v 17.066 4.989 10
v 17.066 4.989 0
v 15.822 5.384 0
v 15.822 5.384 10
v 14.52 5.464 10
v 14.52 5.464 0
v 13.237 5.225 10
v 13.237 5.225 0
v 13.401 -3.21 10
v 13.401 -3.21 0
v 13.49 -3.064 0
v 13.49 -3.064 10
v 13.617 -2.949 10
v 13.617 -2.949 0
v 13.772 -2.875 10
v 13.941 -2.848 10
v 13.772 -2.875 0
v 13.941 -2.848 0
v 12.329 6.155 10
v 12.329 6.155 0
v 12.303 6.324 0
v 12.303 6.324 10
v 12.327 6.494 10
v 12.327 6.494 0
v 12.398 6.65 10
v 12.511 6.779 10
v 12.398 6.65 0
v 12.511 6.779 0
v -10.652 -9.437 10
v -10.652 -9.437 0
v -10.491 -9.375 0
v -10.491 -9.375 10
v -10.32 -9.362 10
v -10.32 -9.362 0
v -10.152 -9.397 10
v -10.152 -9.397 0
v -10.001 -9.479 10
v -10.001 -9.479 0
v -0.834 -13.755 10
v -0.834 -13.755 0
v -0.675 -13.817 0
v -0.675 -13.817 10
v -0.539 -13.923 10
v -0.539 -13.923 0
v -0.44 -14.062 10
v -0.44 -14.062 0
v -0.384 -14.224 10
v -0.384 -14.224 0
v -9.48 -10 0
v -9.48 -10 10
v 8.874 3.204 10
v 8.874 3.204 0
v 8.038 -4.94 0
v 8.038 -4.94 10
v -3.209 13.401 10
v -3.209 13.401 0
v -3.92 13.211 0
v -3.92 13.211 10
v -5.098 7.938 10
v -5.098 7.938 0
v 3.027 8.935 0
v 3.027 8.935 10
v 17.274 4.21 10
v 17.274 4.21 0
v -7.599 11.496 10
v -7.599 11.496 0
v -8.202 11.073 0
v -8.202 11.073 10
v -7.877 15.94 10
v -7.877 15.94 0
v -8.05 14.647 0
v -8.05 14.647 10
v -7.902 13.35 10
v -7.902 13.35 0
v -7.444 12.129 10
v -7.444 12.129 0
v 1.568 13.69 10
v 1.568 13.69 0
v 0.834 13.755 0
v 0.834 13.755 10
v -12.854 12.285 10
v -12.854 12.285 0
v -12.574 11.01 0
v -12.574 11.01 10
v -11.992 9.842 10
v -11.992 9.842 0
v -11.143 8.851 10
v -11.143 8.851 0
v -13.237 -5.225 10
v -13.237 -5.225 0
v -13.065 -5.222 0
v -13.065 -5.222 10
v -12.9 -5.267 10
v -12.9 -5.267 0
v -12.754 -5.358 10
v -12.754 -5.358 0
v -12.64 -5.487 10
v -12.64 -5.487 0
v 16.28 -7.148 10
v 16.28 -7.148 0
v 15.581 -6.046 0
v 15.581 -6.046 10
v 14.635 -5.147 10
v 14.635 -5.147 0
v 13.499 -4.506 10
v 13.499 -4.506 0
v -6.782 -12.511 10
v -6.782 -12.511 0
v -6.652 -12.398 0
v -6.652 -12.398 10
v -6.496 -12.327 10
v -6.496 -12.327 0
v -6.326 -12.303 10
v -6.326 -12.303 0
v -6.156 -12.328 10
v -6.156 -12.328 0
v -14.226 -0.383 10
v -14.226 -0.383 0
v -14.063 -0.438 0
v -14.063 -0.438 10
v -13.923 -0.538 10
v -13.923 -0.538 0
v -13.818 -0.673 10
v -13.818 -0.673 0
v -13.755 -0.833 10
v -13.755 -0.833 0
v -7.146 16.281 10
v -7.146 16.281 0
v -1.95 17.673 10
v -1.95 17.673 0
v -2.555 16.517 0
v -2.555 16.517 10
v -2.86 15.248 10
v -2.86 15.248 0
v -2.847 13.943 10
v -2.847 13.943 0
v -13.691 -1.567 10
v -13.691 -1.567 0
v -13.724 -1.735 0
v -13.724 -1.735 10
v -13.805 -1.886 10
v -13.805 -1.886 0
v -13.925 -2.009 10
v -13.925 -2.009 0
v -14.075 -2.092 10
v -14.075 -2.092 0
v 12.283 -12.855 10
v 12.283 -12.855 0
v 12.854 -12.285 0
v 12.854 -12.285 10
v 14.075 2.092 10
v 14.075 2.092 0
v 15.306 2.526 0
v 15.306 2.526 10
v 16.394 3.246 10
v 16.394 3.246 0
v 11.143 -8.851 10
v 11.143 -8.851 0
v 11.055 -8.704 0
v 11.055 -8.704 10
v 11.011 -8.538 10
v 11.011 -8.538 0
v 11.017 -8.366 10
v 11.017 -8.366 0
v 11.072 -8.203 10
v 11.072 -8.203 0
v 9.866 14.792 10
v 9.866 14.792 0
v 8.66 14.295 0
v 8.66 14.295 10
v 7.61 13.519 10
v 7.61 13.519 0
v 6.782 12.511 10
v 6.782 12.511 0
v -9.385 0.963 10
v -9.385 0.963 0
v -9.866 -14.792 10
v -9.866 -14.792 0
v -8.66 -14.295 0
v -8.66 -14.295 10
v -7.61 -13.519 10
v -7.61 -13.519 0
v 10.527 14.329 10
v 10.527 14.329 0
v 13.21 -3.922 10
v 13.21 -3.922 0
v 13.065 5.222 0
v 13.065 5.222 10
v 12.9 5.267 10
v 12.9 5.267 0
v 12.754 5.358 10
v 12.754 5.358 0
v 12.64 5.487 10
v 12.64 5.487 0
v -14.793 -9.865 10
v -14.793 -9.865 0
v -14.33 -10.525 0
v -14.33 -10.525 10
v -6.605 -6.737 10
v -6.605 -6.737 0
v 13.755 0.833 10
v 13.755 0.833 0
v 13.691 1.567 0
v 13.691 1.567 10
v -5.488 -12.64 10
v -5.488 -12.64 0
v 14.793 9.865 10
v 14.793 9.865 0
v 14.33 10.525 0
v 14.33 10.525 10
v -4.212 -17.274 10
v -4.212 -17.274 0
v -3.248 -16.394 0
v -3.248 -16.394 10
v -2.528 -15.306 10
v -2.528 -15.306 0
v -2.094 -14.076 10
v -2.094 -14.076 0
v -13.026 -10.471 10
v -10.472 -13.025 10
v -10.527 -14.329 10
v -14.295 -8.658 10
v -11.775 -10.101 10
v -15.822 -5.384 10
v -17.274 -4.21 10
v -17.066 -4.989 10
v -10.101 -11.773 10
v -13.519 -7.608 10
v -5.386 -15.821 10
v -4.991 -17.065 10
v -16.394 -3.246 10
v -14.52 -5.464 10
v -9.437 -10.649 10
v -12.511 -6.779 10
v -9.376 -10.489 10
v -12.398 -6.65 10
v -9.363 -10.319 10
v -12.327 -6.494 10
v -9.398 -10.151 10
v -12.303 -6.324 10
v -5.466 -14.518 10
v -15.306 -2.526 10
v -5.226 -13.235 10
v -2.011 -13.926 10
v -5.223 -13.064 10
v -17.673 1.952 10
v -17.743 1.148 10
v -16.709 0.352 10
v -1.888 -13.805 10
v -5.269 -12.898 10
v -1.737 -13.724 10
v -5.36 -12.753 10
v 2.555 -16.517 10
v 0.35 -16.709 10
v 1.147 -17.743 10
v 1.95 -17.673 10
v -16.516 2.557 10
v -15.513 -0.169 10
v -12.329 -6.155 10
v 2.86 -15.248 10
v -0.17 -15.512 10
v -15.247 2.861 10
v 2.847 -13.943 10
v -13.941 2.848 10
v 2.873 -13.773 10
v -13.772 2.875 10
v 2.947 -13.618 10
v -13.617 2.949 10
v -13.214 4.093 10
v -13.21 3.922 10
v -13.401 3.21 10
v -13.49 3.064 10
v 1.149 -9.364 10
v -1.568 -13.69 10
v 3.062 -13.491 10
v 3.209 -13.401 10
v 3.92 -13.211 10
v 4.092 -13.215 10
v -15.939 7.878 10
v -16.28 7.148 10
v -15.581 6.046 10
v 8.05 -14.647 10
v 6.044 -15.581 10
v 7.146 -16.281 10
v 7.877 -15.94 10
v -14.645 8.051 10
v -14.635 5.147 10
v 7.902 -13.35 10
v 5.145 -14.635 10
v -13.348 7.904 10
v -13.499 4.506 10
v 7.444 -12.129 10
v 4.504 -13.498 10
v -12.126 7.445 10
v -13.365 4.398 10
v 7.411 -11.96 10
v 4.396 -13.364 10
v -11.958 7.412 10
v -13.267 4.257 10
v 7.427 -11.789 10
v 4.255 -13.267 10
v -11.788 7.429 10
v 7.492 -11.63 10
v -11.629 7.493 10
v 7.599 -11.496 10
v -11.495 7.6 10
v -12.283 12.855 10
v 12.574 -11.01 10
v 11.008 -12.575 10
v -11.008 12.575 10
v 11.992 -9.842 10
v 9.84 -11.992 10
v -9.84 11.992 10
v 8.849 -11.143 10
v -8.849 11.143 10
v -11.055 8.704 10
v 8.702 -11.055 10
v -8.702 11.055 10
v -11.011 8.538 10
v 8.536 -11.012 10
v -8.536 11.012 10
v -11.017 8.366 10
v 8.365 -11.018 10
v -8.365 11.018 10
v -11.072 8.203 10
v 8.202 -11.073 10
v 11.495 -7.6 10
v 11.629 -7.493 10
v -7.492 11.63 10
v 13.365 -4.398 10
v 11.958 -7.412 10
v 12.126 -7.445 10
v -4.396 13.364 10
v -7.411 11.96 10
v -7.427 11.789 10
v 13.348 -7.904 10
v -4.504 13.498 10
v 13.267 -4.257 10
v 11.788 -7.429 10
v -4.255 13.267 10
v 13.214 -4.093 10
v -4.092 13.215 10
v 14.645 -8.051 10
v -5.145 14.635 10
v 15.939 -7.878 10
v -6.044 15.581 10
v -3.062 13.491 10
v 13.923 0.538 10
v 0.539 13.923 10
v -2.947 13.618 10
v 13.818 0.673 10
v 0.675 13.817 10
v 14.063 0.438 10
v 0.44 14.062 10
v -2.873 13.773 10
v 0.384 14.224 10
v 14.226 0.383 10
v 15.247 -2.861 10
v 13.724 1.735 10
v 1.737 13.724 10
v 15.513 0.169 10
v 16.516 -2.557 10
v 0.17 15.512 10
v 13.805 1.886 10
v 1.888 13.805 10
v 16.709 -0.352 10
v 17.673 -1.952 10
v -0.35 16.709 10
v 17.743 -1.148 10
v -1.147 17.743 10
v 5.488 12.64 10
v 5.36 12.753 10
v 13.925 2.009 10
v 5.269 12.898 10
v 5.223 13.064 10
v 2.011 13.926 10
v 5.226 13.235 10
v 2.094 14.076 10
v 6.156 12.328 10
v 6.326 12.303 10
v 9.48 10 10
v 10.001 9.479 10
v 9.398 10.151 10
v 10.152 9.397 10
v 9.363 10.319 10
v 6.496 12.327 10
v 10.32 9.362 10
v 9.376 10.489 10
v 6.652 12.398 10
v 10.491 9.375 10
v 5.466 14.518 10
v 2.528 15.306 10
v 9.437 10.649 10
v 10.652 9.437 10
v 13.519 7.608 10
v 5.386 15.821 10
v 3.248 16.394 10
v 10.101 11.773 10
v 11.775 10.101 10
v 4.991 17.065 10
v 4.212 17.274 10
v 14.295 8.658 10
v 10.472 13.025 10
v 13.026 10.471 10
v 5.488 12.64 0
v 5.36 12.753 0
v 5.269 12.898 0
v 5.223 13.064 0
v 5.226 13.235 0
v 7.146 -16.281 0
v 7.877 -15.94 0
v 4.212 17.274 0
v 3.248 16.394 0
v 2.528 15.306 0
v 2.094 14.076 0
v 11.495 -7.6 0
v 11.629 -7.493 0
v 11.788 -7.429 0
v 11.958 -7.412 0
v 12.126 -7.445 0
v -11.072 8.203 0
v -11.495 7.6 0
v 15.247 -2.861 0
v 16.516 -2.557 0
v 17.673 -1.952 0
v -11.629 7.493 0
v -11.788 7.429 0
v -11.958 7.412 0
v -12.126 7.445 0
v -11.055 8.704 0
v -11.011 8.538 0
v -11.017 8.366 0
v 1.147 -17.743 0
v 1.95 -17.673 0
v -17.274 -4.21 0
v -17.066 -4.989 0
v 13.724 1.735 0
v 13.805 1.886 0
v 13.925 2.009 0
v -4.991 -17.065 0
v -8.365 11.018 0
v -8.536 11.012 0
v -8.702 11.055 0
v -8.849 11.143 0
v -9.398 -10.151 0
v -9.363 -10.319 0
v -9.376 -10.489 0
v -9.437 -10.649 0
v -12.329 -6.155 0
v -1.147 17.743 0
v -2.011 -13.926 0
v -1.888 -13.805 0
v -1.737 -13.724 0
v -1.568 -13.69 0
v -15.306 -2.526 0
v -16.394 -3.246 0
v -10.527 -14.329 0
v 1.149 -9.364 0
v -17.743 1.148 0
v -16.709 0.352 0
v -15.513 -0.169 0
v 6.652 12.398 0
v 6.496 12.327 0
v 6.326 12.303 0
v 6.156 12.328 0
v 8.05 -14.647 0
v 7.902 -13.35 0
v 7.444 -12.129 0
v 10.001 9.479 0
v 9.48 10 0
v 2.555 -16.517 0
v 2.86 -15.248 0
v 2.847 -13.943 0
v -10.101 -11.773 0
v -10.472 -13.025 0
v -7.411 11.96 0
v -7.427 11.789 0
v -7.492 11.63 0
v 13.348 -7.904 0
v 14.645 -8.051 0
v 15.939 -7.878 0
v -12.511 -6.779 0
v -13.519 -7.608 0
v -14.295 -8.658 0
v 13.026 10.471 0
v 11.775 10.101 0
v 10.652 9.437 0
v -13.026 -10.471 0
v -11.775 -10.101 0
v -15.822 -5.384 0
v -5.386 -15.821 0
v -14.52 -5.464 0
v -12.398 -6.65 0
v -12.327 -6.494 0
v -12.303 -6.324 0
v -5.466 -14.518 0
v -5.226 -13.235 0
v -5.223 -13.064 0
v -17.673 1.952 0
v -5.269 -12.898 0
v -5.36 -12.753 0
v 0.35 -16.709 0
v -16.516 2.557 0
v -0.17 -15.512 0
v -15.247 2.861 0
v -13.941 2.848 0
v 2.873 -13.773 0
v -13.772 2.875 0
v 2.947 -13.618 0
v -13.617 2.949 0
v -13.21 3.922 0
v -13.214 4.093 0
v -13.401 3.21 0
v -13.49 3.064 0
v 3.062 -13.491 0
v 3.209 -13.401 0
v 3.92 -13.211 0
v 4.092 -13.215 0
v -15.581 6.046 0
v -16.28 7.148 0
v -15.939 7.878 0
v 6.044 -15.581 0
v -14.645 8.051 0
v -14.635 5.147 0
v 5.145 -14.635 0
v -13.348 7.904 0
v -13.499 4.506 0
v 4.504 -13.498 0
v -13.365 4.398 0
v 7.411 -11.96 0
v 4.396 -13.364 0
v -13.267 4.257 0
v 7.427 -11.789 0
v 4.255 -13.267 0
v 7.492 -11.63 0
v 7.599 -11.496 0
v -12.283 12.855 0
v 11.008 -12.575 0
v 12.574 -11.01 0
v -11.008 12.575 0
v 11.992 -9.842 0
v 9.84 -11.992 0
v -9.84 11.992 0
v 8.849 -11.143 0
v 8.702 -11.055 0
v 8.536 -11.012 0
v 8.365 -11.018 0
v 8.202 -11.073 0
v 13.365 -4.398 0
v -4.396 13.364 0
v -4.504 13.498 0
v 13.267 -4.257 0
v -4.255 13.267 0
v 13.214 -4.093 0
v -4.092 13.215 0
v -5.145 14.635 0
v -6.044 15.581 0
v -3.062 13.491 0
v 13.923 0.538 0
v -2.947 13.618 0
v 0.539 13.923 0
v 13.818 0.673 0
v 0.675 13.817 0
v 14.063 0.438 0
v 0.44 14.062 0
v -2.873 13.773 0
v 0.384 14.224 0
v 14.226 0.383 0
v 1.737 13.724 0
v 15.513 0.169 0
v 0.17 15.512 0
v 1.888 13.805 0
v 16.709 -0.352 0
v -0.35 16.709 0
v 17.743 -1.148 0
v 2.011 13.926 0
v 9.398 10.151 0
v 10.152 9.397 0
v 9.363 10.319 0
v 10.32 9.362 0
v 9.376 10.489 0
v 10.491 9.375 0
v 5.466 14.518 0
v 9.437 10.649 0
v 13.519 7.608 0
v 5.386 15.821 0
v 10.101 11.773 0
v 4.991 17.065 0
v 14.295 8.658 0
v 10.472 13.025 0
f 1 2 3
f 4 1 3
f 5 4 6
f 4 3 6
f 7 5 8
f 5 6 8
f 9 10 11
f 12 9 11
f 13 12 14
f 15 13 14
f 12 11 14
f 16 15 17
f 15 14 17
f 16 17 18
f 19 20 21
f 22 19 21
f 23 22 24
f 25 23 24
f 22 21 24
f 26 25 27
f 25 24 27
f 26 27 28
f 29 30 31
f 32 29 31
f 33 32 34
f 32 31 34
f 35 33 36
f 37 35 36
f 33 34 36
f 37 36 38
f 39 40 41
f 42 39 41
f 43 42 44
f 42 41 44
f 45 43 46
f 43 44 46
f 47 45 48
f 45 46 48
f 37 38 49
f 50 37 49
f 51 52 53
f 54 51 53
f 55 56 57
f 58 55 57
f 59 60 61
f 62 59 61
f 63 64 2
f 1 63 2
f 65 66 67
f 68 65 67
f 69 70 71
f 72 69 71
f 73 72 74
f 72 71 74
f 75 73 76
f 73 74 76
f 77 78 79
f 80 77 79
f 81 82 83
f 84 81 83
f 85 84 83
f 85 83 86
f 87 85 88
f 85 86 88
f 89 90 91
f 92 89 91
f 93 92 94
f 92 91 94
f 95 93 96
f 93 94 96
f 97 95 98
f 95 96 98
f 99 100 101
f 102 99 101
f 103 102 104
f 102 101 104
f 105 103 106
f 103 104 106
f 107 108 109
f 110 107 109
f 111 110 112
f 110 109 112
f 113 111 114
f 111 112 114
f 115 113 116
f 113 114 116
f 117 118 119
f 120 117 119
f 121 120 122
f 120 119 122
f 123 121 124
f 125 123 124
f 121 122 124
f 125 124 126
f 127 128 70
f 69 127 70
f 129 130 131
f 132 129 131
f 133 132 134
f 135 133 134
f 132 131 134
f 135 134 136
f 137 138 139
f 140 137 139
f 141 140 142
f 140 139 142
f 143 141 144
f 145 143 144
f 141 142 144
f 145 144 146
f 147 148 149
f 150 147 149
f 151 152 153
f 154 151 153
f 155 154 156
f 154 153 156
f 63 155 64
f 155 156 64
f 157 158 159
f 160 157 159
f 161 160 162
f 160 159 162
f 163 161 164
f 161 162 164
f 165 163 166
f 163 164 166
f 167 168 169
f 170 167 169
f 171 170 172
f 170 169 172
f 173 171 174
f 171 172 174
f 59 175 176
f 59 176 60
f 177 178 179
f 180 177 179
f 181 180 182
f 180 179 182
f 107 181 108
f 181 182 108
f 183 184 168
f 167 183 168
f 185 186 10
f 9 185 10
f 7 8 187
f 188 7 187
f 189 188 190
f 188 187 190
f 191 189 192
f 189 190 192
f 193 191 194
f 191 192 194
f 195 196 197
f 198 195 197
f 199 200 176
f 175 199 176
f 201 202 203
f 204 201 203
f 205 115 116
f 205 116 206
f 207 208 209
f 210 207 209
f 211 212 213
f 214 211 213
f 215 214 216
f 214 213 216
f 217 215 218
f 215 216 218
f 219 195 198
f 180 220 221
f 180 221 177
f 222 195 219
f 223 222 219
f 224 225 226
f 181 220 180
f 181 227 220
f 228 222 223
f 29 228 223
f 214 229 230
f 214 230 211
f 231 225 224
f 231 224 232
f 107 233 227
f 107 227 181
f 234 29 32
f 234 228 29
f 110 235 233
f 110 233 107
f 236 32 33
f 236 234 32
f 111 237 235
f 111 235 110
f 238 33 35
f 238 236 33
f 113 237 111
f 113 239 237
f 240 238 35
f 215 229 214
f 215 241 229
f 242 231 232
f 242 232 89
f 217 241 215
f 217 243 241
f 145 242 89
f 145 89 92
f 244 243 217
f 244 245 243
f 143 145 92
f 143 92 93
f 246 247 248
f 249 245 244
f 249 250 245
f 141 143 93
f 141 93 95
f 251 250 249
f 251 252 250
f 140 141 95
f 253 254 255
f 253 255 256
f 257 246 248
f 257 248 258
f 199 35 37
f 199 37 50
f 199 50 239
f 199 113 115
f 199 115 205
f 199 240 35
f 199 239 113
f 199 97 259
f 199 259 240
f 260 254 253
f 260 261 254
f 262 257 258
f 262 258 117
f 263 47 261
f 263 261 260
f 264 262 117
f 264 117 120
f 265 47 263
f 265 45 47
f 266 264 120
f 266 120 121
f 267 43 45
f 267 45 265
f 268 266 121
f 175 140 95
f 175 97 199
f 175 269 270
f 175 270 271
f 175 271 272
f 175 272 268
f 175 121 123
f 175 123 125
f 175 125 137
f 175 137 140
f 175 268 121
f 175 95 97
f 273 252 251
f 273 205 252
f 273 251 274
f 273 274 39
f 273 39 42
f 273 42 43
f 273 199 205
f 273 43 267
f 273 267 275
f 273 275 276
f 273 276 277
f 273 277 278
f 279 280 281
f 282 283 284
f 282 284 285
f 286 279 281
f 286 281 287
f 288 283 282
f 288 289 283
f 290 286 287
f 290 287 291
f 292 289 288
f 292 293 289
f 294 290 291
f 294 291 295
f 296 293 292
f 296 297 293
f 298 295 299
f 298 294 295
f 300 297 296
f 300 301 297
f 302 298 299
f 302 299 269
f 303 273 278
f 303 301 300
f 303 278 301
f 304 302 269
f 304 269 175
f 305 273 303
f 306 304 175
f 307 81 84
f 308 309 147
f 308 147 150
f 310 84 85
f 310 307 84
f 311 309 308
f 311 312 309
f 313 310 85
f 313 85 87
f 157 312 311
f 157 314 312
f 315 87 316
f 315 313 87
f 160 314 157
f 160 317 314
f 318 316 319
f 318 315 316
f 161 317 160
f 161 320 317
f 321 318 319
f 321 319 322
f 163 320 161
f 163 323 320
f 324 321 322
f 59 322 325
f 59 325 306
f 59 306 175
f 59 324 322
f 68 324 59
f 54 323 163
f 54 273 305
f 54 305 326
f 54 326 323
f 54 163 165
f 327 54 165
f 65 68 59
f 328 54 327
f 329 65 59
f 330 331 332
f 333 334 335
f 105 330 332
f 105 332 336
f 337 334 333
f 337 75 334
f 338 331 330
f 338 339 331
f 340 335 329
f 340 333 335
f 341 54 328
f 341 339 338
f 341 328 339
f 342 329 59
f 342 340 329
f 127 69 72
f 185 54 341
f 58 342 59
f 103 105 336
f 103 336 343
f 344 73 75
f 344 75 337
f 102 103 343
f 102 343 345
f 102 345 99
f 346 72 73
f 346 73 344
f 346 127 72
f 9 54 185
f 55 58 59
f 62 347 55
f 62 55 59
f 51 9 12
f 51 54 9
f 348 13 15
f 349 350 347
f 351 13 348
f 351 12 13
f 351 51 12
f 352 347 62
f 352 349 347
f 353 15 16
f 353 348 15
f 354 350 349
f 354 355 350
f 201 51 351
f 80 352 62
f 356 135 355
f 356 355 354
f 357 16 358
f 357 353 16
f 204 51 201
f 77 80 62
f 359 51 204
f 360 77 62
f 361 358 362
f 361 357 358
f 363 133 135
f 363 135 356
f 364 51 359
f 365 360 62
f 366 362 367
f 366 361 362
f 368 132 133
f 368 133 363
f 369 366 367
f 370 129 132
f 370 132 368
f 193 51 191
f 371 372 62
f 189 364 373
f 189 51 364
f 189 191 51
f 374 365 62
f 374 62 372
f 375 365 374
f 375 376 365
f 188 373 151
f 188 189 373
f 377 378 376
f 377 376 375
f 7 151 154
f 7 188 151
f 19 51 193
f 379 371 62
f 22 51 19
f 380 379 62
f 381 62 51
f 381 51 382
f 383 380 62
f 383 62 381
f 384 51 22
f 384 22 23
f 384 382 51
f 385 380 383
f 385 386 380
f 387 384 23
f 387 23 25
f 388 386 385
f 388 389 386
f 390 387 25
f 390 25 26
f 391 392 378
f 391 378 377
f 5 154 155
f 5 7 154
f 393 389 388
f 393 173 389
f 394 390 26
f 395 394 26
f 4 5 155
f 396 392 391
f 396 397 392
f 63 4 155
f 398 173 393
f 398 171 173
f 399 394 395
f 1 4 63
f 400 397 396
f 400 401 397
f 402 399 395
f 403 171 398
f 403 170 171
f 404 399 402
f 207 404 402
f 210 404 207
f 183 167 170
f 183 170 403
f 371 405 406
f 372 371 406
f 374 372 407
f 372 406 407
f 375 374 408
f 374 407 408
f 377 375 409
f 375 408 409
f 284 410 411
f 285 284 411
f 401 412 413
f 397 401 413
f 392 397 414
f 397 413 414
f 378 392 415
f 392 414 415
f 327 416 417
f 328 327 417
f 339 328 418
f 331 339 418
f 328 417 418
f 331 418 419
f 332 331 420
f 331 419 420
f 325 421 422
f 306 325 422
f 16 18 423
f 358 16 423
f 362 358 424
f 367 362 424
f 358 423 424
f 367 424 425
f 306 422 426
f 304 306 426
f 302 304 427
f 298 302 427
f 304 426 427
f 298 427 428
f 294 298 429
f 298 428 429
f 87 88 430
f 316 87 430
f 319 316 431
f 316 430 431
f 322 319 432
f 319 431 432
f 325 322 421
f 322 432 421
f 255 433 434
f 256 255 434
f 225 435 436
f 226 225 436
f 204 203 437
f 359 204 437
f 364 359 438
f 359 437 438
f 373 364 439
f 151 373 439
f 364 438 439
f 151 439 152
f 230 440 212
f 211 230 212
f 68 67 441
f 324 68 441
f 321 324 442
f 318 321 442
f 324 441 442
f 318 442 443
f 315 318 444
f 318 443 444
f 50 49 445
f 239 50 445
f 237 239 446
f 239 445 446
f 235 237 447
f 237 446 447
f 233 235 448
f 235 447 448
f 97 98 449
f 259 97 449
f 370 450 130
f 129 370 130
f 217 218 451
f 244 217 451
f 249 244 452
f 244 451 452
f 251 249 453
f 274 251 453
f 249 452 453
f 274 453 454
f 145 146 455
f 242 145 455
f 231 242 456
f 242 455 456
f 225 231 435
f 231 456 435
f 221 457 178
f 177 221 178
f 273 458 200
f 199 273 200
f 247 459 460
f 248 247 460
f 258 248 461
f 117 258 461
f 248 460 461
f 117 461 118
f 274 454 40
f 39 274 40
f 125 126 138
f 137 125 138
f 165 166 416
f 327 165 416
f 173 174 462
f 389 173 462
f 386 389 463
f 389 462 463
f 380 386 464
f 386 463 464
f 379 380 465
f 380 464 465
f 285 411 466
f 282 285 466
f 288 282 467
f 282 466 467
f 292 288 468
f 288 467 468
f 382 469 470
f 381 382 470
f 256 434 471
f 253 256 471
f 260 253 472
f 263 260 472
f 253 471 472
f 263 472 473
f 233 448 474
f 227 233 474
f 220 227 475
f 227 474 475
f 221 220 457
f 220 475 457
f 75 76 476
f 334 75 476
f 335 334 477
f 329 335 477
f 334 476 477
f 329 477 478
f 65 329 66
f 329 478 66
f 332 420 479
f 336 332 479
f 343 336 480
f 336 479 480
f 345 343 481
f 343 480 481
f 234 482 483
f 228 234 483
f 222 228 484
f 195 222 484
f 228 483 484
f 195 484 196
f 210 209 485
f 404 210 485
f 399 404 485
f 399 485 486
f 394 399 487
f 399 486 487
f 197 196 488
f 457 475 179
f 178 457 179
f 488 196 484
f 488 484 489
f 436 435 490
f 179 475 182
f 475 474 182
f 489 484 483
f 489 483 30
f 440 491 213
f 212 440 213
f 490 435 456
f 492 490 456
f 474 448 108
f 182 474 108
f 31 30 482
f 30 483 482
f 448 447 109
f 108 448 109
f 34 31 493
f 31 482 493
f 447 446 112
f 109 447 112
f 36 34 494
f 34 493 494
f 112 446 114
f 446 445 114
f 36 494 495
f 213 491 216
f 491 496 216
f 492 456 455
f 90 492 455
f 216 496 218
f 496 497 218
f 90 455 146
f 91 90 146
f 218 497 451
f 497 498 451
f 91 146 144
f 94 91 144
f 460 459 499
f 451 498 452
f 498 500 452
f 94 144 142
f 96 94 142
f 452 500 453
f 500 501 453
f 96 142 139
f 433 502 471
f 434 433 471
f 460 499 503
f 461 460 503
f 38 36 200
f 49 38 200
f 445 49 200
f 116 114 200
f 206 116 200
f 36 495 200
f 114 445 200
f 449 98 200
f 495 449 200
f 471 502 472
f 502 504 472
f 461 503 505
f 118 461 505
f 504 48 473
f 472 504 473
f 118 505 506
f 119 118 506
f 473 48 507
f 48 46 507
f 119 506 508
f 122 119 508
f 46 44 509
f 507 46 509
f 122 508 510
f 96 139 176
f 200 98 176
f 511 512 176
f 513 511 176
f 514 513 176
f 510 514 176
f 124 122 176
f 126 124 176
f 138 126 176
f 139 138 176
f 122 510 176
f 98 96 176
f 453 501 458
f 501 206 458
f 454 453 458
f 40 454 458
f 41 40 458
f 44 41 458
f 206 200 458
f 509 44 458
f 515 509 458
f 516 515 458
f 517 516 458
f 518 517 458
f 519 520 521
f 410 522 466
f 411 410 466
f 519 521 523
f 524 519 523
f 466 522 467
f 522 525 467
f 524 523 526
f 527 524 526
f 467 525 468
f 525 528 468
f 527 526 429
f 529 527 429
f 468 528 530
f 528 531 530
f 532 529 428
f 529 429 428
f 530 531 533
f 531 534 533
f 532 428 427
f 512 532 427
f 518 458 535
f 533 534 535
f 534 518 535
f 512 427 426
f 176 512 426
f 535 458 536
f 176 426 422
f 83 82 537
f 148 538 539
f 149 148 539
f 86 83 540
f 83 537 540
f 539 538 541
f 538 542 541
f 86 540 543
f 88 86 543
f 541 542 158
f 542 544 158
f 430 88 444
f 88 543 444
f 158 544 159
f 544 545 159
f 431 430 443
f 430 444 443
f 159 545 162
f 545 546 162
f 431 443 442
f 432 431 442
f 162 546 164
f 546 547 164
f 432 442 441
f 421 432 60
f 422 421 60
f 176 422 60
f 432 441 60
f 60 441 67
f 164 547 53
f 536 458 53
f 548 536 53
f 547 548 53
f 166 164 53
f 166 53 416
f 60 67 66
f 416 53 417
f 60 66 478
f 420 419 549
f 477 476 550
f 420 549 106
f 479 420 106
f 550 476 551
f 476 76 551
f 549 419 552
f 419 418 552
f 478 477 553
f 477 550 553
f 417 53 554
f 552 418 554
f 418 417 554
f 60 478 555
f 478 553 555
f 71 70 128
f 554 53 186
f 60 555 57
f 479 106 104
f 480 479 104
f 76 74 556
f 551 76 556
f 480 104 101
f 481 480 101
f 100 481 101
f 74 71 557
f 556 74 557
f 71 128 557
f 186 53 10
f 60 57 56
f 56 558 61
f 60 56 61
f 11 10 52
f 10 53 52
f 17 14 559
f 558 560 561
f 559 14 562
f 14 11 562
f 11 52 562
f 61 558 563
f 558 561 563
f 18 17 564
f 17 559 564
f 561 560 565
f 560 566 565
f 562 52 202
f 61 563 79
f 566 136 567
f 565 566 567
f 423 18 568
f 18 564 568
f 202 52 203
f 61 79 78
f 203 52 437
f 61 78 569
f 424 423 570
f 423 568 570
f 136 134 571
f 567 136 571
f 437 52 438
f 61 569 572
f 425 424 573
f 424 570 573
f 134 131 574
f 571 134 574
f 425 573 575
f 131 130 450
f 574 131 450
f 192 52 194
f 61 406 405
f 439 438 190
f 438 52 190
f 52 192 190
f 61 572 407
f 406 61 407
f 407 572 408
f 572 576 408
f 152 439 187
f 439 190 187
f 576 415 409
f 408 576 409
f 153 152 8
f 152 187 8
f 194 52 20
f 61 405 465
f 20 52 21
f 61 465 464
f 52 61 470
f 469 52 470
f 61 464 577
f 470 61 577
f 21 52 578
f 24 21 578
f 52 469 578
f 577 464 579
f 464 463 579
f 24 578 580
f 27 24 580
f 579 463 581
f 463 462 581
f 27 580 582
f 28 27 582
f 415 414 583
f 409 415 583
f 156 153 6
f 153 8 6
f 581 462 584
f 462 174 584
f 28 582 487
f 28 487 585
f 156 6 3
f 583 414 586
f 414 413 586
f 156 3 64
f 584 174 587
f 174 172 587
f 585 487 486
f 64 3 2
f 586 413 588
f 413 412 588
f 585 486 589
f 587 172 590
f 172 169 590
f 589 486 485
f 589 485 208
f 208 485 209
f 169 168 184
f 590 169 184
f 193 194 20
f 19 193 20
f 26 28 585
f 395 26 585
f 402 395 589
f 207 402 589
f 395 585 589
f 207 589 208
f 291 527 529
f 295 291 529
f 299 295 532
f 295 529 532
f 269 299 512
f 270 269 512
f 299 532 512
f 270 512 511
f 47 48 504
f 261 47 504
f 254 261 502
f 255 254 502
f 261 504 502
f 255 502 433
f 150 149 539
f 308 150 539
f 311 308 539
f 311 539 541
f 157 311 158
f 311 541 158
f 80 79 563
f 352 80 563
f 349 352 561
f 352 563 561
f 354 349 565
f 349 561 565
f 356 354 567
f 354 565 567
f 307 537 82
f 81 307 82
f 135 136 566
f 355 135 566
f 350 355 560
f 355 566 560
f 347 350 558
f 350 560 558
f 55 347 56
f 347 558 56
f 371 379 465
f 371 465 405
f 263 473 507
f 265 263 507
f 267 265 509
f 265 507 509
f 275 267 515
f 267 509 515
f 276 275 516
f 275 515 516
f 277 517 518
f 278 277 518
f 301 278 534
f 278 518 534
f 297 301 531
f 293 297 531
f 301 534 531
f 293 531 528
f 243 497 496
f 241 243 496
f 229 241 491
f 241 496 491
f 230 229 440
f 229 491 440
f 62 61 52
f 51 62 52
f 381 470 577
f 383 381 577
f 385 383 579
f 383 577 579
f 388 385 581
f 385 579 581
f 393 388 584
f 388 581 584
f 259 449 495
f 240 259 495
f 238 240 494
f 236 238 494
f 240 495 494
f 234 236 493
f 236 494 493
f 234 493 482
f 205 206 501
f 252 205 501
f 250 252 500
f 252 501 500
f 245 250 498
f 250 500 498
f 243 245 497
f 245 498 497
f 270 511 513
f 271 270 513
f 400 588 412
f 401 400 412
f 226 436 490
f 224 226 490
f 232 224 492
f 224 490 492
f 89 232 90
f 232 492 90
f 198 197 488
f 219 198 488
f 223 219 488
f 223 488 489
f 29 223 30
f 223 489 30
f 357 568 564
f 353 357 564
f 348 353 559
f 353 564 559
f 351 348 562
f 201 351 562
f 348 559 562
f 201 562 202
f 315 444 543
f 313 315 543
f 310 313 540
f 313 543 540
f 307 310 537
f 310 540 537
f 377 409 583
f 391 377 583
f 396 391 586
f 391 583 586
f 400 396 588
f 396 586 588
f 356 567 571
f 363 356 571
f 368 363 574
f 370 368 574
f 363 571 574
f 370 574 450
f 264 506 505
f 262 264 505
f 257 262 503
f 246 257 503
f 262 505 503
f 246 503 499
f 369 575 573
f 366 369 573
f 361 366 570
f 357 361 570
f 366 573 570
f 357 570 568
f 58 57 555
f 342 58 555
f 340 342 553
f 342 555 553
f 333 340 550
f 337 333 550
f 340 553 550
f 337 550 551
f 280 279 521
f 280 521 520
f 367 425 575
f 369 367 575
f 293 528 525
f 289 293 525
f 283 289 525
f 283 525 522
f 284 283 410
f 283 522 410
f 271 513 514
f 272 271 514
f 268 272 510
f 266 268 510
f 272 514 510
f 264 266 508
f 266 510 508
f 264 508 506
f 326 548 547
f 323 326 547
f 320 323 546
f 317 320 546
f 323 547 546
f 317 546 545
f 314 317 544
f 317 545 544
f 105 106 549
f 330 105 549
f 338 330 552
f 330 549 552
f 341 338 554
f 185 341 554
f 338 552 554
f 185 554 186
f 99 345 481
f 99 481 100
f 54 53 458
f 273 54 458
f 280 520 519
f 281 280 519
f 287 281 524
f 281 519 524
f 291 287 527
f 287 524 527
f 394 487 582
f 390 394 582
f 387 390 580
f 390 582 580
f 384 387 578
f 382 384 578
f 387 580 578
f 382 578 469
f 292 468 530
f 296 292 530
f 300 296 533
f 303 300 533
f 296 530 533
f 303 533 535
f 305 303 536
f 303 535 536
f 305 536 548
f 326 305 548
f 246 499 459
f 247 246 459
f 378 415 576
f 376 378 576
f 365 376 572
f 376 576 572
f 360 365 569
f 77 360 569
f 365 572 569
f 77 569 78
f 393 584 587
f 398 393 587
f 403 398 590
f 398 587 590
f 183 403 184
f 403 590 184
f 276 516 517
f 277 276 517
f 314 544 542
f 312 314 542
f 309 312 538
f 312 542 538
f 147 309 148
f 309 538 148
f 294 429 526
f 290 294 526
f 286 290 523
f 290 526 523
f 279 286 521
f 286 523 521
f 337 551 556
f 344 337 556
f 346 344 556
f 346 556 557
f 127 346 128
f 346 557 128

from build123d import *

# Parameters (mm, degrees)
F1_DEPTH = 10


with BuildPart() as f1:
    # F0 (on Top) → F1 (new body)
    with BuildSketch(Plane.XY):
        with BuildLine():
            ThreePointArc((0.834247, 13.754724), (0.539473, 13.922611), (0.384061, 14.224148))
            ThreePointArc((0.384061, 14.224148), (-0.053041, 16.126356), (-1.146638, 17.742988))
            Line((-1.146638, 17.742988), (-1.950006, 17.672744))
            ThreePointArc((-1.950006, 17.672744), (-2.74627, 15.891587), (-2.846993, 13.943148))
            ThreePointArc((-2.846993, 13.943148), (-2.94723, 13.618388), (-3.20868, 13.401223))
            Line((-3.20868, 13.401223), (-3.920457, 13.210542))
            ThreePointArc((-3.920457, 13.210542), (-4.254874, 13.267486), (-4.504046, 13.497684))
            ThreePointArc((-4.504046, 13.497684), (-5.565381, 15.135677), (-7.145946, 16.280782))
            Line((-7.145946, 16.280782), (-7.876841, 15.940006))
            ThreePointArc((-7.876841, 15.940006), (-8.015892, 13.993927), (-7.444136, 12.128545))
            ThreePointArc((-7.444136, 12.128545), (-7.427254, 11.789086), (-7.598661, 11.495597))
            Line((-7.598661, 11.495597), (-8.202296, 11.072974))
            ThreePointArc((-8.202296, 11.072974), (-8.536021, 11.012106), (-8.848898, 11.1432))
            ThreePointArc((-8.848898, 11.1432), (-10.406453, 12.319412), (-12.283348, 12.854873))
            Line((-12.283348, 12.854873), (-12.853612, 12.284668))
            ThreePointArc((-12.853612, 12.284668), (-12.31868, 10.408393), (-11.143406, 8.85106))
            ThreePointArc((-11.143406, 8.85106), (-11.01144, 8.537847), (-11.072132, 8.203432))
            Line((-11.072132, 8.203432), (-11.494817, 7.599841))
            ThreePointArc((-11.494817, 7.599841), (-11.787598, 7.428503), (-12.126443, 7.444681))
            ThreePointArc((-12.126443, 7.444681), (-13.992354, 8.017243), (-15.939197, 7.878477))
            Line((-15.939197, 7.878477), (-16.280048, 7.147617))
            ThreePointArc((-16.280048, 7.147617), (-15.135653, 5.567454), (-13.498617, 4.506006))
            ThreePointArc((-13.498617, 4.506006), (-13.267485, 4.256818), (-13.21014, 3.921813))
            Line((-13.21014, 3.921813), (-13.400893, 3.210056))
            ThreePointArc((-13.400893, 3.210056), (-13.617417, 2.948914), (-13.94136, 2.848224))
            ThreePointArc((-13.94136, 2.848224), (-15.890571, 2.748077), (-17.672544, 1.95182))
            Line((-17.672544, 1.95182), (-17.74287, 1.148459))
            ThreePointArc((-17.74287, 1.148459), (-16.127043, 0.054997), (-14.225696, -0.382538))
            ThreePointArc((-14.225696, -0.382538), (-13.923275, -0.537647), (-13.75481, -0.832836))
            Line((-13.75481, -0.832836), (-13.690624, -1.566909))
            ThreePointArc((-13.690624, -1.566909), (-13.804774, -1.886358), (-14.074743, -2.091771))
            ThreePointArc((-14.074743, -2.091771), (-15.87215, -2.852547), (-17.274321, -4.210255))
            Line((-17.274321, -4.210255), (-17.06564, -4.989221))
            ThreePointArc((-17.06564, -4.989221), (-15.173273, -5.464093), (-13.236946, -5.224943))
            ThreePointArc((-13.236946, -5.224943), (-12.899713, -5.267264), (-12.640446, -5.487031))
            Line((-12.640446, -5.487031), (-12.329064, -6.154883))
            ThreePointArc((-12.329064, -6.154883), (-12.327072, -6.494108), (-12.510505, -6.779467))
            ThreePointArc((-12.510505, -6.779467), (-13.939314, -8.109113), (-14.79256, -9.864511))
            Line((-14.79256, -9.864511), (-14.330042, -10.525127))
            ThreePointArc((-14.330042, -10.525127), (-12.389383, -10.324133), (-10.651624, -9.437142))
            ThreePointArc((-10.651624, -9.437142), (-10.320255, -9.36157), (-10.001459, -9.47941))
            Line((-10.001459, -9.47941), (-9.480437, -10.000486))
            ThreePointArc((-9.480437, -10.000486), (-9.362542, -10.318572), (-9.437314, -10.64946))
            ThreePointArc((-9.437314, -10.64946), (-10.32519, -12.387599), (-10.526598, -14.328962))
            Line((-10.526598, -14.328962), (-9.86603, -14.791547))
            ThreePointArc((-9.86603, -14.791547), (-8.11115, -13.93893), (-6.78156, -12.511083))
            ThreePointArc((-6.78156, -12.511083), (-6.496022, -12.326734), (-6.156148, -12.328432))
            Line((-6.156148, -12.328432), (-5.488329, -12.639883))
            ThreePointArc((-5.488329, -12.639883), (-5.268753, -12.898464), (-5.225845, -13.234971))
            ThreePointArc((-5.225845, -13.234971), (-5.465697, -15.171959), (-4.990972, -17.065128))
            Line((-4.990972, -17.065128), (-4.212028, -17.273888))
            ThreePointArc((-4.212028, -17.273888), (-2.854593, -15.872486), (-2.093539, -14.076003))
            ThreePointArc((-2.093539, -14.076003), (-1.888272, -13.805111), (-1.568315, -13.690463))
            Line((-1.568315, -13.690463), (-0.834247, -13.754724))
            ThreePointArc((-0.834247, -13.754724), (-0.539473, -13.922611), (-0.384061, -14.224148))
            ThreePointArc((-0.384061, -14.224148), (0.053041, -16.126356), (1.146638, -17.742988))
            Line((1.146638, -17.742988), (1.950006, -17.672744))
            ThreePointArc((1.950006, -17.672744), (2.74627, -15.891587), (2.846993, -13.943148))
            ThreePointArc((2.846993, -13.943148), (2.94723, -13.618388), (3.20868, -13.401223))
            Line((3.20868, -13.401223), (3.920457, -13.210542))
            ThreePointArc((3.920457, -13.210542), (4.254874, -13.267486), (4.504046, -13.497684))
            ThreePointArc((4.504046, -13.497684), (5.565381, -15.135677), (7.145946, -16.280782))
            Line((7.145946, -16.280782), (7.876841, -15.940006))
            ThreePointArc((7.876841, -15.940006), (8.015892, -13.993927), (7.444136, -12.128545))
            ThreePointArc((7.444136, -12.128545), (7.427254, -11.789086), (7.598661, -11.495597))
            Line((7.598661, -11.495597), (8.202296, -11.072974))
            ThreePointArc((8.202296, -11.072974), (8.536021, -11.012106), (8.848898, -11.1432))
            ThreePointArc((8.848898, -11.1432), (10.406453, -12.319412), (12.283348, -12.854873))
            Line((12.283348, -12.854873), (12.853612, -12.284668))
            ThreePointArc((12.853612, -12.284668), (12.31868, -10.408393), (11.143406, -8.85106))
            ThreePointArc((11.143406, -8.85106), (11.01144, -8.537847), (11.072132, -8.203432))
            Line((11.072132, -8.203432), (11.494817, -7.599841))
            ThreePointArc((11.494817, -7.599841), (11.787598, -7.428503), (12.126443, -7.444681))
            ThreePointArc((12.126443, -7.444681), (13.992354, -8.017243), (15.939197, -7.878477))
            Line((15.939197, -7.878477), (16.280048, -7.147617))
            ThreePointArc((16.280048, -7.147617), (15.135653, -5.567454), (13.498617, -4.506006))
            ThreePointArc((13.498617, -4.506006), (13.267485, -4.256818), (13.21014, -3.921813))
            Line((13.21014, -3.921813), (13.400893, -3.210056))
            ThreePointArc((13.400893, -3.210056), (13.617417, -2.948914), (13.94136, -2.848224))
            ThreePointArc((13.94136, -2.848224), (15.890571, -2.748077), (17.672544, -1.95182))
            Line((17.672544, -1.95182), (17.74287, -1.148459))
            ThreePointArc((17.74287, -1.148459), (16.127043, -0.054997), (14.225696, 0.382538))
            ThreePointArc((14.225696, 0.382538), (13.923275, 0.537647), (13.75481, 0.832836))
            Line((13.75481, 0.832836), (13.690624, 1.566909))
            ThreePointArc((13.690624, 1.566909), (13.804774, 1.886358), (14.074743, 2.091771))
            ThreePointArc((14.074743, 2.091771), (15.87215, 2.852547), (17.274321, 4.210255))
            Line((17.274321, 4.210255), (17.06564, 4.989221))
            ThreePointArc((17.06564, 4.989221), (15.173273, 5.464093), (13.236946, 5.224943))
            ThreePointArc((13.236946, 5.224943), (12.899713, 5.267264), (12.640446, 5.487031))
            Line((12.640446, 5.487031), (12.329064, 6.154883))
            ThreePointArc((12.329064, 6.154883), (12.327072, 6.494108), (12.510505, 6.779467))
            ThreePointArc((12.510505, 6.779467), (13.939314, 8.109113), (14.79256, 9.864511))
            Line((14.79256, 9.864511), (14.330042, 10.525127))
            ThreePointArc((14.330042, 10.525127), (12.389383, 10.324133), (10.651624, 9.437142))
            ThreePointArc((10.651624, 9.437142), (10.320255, 9.36157), (10.001459, 9.47941))
            Line((10.001459, 9.47941), (9.480437, 10.000486))
            ThreePointArc((9.480437, 10.000486), (9.362542, 10.318572), (9.437314, 10.64946))
            ThreePointArc((9.437314, 10.64946), (10.32519, 12.387599), (10.526598, 14.328962))
            Line((10.526598, 14.328962), (9.86603, 14.791547))
            ThreePointArc((9.86603, 14.791547), (8.11115, 13.93893), (6.78156, 12.511083))
            ThreePointArc((6.78156, 12.511083), (6.496022, 12.326734), (6.156148, 12.328432))
            Line((6.156148, 12.328432), (5.488329, 12.639883))
            ThreePointArc((5.488329, 12.639883), (5.268753, 12.898464), (5.225845, 13.234971))
            ThreePointArc((5.225845, 13.234971), (5.465697, 15.171959), (4.990972, 17.065128))
            Line((4.990972, 17.065128), (4.212028, 17.273888))
            ThreePointArc((4.212028, 17.273888), (2.854593, 15.872486), (2.093539, 14.076003))
            ThreePointArc((2.093539, 14.076003), (1.888272, 13.805111), (1.568315, 13.690463))
            Line((1.568315, 13.690463), (0.834247, 13.754724))
        make_face()
        Polygon((8.873521, 3.204124), (8.037635, -4.93986), (1.149246, -9.364028), (-6.604549, -6.736893), (-9.384984, 0.96326), (-5.098334, 7.938059), (3.027465, 8.935337), align=None, mode=Mode.SUBTRACT)
    extrude(amount=F1_DEPTH)


solid = f1.part
